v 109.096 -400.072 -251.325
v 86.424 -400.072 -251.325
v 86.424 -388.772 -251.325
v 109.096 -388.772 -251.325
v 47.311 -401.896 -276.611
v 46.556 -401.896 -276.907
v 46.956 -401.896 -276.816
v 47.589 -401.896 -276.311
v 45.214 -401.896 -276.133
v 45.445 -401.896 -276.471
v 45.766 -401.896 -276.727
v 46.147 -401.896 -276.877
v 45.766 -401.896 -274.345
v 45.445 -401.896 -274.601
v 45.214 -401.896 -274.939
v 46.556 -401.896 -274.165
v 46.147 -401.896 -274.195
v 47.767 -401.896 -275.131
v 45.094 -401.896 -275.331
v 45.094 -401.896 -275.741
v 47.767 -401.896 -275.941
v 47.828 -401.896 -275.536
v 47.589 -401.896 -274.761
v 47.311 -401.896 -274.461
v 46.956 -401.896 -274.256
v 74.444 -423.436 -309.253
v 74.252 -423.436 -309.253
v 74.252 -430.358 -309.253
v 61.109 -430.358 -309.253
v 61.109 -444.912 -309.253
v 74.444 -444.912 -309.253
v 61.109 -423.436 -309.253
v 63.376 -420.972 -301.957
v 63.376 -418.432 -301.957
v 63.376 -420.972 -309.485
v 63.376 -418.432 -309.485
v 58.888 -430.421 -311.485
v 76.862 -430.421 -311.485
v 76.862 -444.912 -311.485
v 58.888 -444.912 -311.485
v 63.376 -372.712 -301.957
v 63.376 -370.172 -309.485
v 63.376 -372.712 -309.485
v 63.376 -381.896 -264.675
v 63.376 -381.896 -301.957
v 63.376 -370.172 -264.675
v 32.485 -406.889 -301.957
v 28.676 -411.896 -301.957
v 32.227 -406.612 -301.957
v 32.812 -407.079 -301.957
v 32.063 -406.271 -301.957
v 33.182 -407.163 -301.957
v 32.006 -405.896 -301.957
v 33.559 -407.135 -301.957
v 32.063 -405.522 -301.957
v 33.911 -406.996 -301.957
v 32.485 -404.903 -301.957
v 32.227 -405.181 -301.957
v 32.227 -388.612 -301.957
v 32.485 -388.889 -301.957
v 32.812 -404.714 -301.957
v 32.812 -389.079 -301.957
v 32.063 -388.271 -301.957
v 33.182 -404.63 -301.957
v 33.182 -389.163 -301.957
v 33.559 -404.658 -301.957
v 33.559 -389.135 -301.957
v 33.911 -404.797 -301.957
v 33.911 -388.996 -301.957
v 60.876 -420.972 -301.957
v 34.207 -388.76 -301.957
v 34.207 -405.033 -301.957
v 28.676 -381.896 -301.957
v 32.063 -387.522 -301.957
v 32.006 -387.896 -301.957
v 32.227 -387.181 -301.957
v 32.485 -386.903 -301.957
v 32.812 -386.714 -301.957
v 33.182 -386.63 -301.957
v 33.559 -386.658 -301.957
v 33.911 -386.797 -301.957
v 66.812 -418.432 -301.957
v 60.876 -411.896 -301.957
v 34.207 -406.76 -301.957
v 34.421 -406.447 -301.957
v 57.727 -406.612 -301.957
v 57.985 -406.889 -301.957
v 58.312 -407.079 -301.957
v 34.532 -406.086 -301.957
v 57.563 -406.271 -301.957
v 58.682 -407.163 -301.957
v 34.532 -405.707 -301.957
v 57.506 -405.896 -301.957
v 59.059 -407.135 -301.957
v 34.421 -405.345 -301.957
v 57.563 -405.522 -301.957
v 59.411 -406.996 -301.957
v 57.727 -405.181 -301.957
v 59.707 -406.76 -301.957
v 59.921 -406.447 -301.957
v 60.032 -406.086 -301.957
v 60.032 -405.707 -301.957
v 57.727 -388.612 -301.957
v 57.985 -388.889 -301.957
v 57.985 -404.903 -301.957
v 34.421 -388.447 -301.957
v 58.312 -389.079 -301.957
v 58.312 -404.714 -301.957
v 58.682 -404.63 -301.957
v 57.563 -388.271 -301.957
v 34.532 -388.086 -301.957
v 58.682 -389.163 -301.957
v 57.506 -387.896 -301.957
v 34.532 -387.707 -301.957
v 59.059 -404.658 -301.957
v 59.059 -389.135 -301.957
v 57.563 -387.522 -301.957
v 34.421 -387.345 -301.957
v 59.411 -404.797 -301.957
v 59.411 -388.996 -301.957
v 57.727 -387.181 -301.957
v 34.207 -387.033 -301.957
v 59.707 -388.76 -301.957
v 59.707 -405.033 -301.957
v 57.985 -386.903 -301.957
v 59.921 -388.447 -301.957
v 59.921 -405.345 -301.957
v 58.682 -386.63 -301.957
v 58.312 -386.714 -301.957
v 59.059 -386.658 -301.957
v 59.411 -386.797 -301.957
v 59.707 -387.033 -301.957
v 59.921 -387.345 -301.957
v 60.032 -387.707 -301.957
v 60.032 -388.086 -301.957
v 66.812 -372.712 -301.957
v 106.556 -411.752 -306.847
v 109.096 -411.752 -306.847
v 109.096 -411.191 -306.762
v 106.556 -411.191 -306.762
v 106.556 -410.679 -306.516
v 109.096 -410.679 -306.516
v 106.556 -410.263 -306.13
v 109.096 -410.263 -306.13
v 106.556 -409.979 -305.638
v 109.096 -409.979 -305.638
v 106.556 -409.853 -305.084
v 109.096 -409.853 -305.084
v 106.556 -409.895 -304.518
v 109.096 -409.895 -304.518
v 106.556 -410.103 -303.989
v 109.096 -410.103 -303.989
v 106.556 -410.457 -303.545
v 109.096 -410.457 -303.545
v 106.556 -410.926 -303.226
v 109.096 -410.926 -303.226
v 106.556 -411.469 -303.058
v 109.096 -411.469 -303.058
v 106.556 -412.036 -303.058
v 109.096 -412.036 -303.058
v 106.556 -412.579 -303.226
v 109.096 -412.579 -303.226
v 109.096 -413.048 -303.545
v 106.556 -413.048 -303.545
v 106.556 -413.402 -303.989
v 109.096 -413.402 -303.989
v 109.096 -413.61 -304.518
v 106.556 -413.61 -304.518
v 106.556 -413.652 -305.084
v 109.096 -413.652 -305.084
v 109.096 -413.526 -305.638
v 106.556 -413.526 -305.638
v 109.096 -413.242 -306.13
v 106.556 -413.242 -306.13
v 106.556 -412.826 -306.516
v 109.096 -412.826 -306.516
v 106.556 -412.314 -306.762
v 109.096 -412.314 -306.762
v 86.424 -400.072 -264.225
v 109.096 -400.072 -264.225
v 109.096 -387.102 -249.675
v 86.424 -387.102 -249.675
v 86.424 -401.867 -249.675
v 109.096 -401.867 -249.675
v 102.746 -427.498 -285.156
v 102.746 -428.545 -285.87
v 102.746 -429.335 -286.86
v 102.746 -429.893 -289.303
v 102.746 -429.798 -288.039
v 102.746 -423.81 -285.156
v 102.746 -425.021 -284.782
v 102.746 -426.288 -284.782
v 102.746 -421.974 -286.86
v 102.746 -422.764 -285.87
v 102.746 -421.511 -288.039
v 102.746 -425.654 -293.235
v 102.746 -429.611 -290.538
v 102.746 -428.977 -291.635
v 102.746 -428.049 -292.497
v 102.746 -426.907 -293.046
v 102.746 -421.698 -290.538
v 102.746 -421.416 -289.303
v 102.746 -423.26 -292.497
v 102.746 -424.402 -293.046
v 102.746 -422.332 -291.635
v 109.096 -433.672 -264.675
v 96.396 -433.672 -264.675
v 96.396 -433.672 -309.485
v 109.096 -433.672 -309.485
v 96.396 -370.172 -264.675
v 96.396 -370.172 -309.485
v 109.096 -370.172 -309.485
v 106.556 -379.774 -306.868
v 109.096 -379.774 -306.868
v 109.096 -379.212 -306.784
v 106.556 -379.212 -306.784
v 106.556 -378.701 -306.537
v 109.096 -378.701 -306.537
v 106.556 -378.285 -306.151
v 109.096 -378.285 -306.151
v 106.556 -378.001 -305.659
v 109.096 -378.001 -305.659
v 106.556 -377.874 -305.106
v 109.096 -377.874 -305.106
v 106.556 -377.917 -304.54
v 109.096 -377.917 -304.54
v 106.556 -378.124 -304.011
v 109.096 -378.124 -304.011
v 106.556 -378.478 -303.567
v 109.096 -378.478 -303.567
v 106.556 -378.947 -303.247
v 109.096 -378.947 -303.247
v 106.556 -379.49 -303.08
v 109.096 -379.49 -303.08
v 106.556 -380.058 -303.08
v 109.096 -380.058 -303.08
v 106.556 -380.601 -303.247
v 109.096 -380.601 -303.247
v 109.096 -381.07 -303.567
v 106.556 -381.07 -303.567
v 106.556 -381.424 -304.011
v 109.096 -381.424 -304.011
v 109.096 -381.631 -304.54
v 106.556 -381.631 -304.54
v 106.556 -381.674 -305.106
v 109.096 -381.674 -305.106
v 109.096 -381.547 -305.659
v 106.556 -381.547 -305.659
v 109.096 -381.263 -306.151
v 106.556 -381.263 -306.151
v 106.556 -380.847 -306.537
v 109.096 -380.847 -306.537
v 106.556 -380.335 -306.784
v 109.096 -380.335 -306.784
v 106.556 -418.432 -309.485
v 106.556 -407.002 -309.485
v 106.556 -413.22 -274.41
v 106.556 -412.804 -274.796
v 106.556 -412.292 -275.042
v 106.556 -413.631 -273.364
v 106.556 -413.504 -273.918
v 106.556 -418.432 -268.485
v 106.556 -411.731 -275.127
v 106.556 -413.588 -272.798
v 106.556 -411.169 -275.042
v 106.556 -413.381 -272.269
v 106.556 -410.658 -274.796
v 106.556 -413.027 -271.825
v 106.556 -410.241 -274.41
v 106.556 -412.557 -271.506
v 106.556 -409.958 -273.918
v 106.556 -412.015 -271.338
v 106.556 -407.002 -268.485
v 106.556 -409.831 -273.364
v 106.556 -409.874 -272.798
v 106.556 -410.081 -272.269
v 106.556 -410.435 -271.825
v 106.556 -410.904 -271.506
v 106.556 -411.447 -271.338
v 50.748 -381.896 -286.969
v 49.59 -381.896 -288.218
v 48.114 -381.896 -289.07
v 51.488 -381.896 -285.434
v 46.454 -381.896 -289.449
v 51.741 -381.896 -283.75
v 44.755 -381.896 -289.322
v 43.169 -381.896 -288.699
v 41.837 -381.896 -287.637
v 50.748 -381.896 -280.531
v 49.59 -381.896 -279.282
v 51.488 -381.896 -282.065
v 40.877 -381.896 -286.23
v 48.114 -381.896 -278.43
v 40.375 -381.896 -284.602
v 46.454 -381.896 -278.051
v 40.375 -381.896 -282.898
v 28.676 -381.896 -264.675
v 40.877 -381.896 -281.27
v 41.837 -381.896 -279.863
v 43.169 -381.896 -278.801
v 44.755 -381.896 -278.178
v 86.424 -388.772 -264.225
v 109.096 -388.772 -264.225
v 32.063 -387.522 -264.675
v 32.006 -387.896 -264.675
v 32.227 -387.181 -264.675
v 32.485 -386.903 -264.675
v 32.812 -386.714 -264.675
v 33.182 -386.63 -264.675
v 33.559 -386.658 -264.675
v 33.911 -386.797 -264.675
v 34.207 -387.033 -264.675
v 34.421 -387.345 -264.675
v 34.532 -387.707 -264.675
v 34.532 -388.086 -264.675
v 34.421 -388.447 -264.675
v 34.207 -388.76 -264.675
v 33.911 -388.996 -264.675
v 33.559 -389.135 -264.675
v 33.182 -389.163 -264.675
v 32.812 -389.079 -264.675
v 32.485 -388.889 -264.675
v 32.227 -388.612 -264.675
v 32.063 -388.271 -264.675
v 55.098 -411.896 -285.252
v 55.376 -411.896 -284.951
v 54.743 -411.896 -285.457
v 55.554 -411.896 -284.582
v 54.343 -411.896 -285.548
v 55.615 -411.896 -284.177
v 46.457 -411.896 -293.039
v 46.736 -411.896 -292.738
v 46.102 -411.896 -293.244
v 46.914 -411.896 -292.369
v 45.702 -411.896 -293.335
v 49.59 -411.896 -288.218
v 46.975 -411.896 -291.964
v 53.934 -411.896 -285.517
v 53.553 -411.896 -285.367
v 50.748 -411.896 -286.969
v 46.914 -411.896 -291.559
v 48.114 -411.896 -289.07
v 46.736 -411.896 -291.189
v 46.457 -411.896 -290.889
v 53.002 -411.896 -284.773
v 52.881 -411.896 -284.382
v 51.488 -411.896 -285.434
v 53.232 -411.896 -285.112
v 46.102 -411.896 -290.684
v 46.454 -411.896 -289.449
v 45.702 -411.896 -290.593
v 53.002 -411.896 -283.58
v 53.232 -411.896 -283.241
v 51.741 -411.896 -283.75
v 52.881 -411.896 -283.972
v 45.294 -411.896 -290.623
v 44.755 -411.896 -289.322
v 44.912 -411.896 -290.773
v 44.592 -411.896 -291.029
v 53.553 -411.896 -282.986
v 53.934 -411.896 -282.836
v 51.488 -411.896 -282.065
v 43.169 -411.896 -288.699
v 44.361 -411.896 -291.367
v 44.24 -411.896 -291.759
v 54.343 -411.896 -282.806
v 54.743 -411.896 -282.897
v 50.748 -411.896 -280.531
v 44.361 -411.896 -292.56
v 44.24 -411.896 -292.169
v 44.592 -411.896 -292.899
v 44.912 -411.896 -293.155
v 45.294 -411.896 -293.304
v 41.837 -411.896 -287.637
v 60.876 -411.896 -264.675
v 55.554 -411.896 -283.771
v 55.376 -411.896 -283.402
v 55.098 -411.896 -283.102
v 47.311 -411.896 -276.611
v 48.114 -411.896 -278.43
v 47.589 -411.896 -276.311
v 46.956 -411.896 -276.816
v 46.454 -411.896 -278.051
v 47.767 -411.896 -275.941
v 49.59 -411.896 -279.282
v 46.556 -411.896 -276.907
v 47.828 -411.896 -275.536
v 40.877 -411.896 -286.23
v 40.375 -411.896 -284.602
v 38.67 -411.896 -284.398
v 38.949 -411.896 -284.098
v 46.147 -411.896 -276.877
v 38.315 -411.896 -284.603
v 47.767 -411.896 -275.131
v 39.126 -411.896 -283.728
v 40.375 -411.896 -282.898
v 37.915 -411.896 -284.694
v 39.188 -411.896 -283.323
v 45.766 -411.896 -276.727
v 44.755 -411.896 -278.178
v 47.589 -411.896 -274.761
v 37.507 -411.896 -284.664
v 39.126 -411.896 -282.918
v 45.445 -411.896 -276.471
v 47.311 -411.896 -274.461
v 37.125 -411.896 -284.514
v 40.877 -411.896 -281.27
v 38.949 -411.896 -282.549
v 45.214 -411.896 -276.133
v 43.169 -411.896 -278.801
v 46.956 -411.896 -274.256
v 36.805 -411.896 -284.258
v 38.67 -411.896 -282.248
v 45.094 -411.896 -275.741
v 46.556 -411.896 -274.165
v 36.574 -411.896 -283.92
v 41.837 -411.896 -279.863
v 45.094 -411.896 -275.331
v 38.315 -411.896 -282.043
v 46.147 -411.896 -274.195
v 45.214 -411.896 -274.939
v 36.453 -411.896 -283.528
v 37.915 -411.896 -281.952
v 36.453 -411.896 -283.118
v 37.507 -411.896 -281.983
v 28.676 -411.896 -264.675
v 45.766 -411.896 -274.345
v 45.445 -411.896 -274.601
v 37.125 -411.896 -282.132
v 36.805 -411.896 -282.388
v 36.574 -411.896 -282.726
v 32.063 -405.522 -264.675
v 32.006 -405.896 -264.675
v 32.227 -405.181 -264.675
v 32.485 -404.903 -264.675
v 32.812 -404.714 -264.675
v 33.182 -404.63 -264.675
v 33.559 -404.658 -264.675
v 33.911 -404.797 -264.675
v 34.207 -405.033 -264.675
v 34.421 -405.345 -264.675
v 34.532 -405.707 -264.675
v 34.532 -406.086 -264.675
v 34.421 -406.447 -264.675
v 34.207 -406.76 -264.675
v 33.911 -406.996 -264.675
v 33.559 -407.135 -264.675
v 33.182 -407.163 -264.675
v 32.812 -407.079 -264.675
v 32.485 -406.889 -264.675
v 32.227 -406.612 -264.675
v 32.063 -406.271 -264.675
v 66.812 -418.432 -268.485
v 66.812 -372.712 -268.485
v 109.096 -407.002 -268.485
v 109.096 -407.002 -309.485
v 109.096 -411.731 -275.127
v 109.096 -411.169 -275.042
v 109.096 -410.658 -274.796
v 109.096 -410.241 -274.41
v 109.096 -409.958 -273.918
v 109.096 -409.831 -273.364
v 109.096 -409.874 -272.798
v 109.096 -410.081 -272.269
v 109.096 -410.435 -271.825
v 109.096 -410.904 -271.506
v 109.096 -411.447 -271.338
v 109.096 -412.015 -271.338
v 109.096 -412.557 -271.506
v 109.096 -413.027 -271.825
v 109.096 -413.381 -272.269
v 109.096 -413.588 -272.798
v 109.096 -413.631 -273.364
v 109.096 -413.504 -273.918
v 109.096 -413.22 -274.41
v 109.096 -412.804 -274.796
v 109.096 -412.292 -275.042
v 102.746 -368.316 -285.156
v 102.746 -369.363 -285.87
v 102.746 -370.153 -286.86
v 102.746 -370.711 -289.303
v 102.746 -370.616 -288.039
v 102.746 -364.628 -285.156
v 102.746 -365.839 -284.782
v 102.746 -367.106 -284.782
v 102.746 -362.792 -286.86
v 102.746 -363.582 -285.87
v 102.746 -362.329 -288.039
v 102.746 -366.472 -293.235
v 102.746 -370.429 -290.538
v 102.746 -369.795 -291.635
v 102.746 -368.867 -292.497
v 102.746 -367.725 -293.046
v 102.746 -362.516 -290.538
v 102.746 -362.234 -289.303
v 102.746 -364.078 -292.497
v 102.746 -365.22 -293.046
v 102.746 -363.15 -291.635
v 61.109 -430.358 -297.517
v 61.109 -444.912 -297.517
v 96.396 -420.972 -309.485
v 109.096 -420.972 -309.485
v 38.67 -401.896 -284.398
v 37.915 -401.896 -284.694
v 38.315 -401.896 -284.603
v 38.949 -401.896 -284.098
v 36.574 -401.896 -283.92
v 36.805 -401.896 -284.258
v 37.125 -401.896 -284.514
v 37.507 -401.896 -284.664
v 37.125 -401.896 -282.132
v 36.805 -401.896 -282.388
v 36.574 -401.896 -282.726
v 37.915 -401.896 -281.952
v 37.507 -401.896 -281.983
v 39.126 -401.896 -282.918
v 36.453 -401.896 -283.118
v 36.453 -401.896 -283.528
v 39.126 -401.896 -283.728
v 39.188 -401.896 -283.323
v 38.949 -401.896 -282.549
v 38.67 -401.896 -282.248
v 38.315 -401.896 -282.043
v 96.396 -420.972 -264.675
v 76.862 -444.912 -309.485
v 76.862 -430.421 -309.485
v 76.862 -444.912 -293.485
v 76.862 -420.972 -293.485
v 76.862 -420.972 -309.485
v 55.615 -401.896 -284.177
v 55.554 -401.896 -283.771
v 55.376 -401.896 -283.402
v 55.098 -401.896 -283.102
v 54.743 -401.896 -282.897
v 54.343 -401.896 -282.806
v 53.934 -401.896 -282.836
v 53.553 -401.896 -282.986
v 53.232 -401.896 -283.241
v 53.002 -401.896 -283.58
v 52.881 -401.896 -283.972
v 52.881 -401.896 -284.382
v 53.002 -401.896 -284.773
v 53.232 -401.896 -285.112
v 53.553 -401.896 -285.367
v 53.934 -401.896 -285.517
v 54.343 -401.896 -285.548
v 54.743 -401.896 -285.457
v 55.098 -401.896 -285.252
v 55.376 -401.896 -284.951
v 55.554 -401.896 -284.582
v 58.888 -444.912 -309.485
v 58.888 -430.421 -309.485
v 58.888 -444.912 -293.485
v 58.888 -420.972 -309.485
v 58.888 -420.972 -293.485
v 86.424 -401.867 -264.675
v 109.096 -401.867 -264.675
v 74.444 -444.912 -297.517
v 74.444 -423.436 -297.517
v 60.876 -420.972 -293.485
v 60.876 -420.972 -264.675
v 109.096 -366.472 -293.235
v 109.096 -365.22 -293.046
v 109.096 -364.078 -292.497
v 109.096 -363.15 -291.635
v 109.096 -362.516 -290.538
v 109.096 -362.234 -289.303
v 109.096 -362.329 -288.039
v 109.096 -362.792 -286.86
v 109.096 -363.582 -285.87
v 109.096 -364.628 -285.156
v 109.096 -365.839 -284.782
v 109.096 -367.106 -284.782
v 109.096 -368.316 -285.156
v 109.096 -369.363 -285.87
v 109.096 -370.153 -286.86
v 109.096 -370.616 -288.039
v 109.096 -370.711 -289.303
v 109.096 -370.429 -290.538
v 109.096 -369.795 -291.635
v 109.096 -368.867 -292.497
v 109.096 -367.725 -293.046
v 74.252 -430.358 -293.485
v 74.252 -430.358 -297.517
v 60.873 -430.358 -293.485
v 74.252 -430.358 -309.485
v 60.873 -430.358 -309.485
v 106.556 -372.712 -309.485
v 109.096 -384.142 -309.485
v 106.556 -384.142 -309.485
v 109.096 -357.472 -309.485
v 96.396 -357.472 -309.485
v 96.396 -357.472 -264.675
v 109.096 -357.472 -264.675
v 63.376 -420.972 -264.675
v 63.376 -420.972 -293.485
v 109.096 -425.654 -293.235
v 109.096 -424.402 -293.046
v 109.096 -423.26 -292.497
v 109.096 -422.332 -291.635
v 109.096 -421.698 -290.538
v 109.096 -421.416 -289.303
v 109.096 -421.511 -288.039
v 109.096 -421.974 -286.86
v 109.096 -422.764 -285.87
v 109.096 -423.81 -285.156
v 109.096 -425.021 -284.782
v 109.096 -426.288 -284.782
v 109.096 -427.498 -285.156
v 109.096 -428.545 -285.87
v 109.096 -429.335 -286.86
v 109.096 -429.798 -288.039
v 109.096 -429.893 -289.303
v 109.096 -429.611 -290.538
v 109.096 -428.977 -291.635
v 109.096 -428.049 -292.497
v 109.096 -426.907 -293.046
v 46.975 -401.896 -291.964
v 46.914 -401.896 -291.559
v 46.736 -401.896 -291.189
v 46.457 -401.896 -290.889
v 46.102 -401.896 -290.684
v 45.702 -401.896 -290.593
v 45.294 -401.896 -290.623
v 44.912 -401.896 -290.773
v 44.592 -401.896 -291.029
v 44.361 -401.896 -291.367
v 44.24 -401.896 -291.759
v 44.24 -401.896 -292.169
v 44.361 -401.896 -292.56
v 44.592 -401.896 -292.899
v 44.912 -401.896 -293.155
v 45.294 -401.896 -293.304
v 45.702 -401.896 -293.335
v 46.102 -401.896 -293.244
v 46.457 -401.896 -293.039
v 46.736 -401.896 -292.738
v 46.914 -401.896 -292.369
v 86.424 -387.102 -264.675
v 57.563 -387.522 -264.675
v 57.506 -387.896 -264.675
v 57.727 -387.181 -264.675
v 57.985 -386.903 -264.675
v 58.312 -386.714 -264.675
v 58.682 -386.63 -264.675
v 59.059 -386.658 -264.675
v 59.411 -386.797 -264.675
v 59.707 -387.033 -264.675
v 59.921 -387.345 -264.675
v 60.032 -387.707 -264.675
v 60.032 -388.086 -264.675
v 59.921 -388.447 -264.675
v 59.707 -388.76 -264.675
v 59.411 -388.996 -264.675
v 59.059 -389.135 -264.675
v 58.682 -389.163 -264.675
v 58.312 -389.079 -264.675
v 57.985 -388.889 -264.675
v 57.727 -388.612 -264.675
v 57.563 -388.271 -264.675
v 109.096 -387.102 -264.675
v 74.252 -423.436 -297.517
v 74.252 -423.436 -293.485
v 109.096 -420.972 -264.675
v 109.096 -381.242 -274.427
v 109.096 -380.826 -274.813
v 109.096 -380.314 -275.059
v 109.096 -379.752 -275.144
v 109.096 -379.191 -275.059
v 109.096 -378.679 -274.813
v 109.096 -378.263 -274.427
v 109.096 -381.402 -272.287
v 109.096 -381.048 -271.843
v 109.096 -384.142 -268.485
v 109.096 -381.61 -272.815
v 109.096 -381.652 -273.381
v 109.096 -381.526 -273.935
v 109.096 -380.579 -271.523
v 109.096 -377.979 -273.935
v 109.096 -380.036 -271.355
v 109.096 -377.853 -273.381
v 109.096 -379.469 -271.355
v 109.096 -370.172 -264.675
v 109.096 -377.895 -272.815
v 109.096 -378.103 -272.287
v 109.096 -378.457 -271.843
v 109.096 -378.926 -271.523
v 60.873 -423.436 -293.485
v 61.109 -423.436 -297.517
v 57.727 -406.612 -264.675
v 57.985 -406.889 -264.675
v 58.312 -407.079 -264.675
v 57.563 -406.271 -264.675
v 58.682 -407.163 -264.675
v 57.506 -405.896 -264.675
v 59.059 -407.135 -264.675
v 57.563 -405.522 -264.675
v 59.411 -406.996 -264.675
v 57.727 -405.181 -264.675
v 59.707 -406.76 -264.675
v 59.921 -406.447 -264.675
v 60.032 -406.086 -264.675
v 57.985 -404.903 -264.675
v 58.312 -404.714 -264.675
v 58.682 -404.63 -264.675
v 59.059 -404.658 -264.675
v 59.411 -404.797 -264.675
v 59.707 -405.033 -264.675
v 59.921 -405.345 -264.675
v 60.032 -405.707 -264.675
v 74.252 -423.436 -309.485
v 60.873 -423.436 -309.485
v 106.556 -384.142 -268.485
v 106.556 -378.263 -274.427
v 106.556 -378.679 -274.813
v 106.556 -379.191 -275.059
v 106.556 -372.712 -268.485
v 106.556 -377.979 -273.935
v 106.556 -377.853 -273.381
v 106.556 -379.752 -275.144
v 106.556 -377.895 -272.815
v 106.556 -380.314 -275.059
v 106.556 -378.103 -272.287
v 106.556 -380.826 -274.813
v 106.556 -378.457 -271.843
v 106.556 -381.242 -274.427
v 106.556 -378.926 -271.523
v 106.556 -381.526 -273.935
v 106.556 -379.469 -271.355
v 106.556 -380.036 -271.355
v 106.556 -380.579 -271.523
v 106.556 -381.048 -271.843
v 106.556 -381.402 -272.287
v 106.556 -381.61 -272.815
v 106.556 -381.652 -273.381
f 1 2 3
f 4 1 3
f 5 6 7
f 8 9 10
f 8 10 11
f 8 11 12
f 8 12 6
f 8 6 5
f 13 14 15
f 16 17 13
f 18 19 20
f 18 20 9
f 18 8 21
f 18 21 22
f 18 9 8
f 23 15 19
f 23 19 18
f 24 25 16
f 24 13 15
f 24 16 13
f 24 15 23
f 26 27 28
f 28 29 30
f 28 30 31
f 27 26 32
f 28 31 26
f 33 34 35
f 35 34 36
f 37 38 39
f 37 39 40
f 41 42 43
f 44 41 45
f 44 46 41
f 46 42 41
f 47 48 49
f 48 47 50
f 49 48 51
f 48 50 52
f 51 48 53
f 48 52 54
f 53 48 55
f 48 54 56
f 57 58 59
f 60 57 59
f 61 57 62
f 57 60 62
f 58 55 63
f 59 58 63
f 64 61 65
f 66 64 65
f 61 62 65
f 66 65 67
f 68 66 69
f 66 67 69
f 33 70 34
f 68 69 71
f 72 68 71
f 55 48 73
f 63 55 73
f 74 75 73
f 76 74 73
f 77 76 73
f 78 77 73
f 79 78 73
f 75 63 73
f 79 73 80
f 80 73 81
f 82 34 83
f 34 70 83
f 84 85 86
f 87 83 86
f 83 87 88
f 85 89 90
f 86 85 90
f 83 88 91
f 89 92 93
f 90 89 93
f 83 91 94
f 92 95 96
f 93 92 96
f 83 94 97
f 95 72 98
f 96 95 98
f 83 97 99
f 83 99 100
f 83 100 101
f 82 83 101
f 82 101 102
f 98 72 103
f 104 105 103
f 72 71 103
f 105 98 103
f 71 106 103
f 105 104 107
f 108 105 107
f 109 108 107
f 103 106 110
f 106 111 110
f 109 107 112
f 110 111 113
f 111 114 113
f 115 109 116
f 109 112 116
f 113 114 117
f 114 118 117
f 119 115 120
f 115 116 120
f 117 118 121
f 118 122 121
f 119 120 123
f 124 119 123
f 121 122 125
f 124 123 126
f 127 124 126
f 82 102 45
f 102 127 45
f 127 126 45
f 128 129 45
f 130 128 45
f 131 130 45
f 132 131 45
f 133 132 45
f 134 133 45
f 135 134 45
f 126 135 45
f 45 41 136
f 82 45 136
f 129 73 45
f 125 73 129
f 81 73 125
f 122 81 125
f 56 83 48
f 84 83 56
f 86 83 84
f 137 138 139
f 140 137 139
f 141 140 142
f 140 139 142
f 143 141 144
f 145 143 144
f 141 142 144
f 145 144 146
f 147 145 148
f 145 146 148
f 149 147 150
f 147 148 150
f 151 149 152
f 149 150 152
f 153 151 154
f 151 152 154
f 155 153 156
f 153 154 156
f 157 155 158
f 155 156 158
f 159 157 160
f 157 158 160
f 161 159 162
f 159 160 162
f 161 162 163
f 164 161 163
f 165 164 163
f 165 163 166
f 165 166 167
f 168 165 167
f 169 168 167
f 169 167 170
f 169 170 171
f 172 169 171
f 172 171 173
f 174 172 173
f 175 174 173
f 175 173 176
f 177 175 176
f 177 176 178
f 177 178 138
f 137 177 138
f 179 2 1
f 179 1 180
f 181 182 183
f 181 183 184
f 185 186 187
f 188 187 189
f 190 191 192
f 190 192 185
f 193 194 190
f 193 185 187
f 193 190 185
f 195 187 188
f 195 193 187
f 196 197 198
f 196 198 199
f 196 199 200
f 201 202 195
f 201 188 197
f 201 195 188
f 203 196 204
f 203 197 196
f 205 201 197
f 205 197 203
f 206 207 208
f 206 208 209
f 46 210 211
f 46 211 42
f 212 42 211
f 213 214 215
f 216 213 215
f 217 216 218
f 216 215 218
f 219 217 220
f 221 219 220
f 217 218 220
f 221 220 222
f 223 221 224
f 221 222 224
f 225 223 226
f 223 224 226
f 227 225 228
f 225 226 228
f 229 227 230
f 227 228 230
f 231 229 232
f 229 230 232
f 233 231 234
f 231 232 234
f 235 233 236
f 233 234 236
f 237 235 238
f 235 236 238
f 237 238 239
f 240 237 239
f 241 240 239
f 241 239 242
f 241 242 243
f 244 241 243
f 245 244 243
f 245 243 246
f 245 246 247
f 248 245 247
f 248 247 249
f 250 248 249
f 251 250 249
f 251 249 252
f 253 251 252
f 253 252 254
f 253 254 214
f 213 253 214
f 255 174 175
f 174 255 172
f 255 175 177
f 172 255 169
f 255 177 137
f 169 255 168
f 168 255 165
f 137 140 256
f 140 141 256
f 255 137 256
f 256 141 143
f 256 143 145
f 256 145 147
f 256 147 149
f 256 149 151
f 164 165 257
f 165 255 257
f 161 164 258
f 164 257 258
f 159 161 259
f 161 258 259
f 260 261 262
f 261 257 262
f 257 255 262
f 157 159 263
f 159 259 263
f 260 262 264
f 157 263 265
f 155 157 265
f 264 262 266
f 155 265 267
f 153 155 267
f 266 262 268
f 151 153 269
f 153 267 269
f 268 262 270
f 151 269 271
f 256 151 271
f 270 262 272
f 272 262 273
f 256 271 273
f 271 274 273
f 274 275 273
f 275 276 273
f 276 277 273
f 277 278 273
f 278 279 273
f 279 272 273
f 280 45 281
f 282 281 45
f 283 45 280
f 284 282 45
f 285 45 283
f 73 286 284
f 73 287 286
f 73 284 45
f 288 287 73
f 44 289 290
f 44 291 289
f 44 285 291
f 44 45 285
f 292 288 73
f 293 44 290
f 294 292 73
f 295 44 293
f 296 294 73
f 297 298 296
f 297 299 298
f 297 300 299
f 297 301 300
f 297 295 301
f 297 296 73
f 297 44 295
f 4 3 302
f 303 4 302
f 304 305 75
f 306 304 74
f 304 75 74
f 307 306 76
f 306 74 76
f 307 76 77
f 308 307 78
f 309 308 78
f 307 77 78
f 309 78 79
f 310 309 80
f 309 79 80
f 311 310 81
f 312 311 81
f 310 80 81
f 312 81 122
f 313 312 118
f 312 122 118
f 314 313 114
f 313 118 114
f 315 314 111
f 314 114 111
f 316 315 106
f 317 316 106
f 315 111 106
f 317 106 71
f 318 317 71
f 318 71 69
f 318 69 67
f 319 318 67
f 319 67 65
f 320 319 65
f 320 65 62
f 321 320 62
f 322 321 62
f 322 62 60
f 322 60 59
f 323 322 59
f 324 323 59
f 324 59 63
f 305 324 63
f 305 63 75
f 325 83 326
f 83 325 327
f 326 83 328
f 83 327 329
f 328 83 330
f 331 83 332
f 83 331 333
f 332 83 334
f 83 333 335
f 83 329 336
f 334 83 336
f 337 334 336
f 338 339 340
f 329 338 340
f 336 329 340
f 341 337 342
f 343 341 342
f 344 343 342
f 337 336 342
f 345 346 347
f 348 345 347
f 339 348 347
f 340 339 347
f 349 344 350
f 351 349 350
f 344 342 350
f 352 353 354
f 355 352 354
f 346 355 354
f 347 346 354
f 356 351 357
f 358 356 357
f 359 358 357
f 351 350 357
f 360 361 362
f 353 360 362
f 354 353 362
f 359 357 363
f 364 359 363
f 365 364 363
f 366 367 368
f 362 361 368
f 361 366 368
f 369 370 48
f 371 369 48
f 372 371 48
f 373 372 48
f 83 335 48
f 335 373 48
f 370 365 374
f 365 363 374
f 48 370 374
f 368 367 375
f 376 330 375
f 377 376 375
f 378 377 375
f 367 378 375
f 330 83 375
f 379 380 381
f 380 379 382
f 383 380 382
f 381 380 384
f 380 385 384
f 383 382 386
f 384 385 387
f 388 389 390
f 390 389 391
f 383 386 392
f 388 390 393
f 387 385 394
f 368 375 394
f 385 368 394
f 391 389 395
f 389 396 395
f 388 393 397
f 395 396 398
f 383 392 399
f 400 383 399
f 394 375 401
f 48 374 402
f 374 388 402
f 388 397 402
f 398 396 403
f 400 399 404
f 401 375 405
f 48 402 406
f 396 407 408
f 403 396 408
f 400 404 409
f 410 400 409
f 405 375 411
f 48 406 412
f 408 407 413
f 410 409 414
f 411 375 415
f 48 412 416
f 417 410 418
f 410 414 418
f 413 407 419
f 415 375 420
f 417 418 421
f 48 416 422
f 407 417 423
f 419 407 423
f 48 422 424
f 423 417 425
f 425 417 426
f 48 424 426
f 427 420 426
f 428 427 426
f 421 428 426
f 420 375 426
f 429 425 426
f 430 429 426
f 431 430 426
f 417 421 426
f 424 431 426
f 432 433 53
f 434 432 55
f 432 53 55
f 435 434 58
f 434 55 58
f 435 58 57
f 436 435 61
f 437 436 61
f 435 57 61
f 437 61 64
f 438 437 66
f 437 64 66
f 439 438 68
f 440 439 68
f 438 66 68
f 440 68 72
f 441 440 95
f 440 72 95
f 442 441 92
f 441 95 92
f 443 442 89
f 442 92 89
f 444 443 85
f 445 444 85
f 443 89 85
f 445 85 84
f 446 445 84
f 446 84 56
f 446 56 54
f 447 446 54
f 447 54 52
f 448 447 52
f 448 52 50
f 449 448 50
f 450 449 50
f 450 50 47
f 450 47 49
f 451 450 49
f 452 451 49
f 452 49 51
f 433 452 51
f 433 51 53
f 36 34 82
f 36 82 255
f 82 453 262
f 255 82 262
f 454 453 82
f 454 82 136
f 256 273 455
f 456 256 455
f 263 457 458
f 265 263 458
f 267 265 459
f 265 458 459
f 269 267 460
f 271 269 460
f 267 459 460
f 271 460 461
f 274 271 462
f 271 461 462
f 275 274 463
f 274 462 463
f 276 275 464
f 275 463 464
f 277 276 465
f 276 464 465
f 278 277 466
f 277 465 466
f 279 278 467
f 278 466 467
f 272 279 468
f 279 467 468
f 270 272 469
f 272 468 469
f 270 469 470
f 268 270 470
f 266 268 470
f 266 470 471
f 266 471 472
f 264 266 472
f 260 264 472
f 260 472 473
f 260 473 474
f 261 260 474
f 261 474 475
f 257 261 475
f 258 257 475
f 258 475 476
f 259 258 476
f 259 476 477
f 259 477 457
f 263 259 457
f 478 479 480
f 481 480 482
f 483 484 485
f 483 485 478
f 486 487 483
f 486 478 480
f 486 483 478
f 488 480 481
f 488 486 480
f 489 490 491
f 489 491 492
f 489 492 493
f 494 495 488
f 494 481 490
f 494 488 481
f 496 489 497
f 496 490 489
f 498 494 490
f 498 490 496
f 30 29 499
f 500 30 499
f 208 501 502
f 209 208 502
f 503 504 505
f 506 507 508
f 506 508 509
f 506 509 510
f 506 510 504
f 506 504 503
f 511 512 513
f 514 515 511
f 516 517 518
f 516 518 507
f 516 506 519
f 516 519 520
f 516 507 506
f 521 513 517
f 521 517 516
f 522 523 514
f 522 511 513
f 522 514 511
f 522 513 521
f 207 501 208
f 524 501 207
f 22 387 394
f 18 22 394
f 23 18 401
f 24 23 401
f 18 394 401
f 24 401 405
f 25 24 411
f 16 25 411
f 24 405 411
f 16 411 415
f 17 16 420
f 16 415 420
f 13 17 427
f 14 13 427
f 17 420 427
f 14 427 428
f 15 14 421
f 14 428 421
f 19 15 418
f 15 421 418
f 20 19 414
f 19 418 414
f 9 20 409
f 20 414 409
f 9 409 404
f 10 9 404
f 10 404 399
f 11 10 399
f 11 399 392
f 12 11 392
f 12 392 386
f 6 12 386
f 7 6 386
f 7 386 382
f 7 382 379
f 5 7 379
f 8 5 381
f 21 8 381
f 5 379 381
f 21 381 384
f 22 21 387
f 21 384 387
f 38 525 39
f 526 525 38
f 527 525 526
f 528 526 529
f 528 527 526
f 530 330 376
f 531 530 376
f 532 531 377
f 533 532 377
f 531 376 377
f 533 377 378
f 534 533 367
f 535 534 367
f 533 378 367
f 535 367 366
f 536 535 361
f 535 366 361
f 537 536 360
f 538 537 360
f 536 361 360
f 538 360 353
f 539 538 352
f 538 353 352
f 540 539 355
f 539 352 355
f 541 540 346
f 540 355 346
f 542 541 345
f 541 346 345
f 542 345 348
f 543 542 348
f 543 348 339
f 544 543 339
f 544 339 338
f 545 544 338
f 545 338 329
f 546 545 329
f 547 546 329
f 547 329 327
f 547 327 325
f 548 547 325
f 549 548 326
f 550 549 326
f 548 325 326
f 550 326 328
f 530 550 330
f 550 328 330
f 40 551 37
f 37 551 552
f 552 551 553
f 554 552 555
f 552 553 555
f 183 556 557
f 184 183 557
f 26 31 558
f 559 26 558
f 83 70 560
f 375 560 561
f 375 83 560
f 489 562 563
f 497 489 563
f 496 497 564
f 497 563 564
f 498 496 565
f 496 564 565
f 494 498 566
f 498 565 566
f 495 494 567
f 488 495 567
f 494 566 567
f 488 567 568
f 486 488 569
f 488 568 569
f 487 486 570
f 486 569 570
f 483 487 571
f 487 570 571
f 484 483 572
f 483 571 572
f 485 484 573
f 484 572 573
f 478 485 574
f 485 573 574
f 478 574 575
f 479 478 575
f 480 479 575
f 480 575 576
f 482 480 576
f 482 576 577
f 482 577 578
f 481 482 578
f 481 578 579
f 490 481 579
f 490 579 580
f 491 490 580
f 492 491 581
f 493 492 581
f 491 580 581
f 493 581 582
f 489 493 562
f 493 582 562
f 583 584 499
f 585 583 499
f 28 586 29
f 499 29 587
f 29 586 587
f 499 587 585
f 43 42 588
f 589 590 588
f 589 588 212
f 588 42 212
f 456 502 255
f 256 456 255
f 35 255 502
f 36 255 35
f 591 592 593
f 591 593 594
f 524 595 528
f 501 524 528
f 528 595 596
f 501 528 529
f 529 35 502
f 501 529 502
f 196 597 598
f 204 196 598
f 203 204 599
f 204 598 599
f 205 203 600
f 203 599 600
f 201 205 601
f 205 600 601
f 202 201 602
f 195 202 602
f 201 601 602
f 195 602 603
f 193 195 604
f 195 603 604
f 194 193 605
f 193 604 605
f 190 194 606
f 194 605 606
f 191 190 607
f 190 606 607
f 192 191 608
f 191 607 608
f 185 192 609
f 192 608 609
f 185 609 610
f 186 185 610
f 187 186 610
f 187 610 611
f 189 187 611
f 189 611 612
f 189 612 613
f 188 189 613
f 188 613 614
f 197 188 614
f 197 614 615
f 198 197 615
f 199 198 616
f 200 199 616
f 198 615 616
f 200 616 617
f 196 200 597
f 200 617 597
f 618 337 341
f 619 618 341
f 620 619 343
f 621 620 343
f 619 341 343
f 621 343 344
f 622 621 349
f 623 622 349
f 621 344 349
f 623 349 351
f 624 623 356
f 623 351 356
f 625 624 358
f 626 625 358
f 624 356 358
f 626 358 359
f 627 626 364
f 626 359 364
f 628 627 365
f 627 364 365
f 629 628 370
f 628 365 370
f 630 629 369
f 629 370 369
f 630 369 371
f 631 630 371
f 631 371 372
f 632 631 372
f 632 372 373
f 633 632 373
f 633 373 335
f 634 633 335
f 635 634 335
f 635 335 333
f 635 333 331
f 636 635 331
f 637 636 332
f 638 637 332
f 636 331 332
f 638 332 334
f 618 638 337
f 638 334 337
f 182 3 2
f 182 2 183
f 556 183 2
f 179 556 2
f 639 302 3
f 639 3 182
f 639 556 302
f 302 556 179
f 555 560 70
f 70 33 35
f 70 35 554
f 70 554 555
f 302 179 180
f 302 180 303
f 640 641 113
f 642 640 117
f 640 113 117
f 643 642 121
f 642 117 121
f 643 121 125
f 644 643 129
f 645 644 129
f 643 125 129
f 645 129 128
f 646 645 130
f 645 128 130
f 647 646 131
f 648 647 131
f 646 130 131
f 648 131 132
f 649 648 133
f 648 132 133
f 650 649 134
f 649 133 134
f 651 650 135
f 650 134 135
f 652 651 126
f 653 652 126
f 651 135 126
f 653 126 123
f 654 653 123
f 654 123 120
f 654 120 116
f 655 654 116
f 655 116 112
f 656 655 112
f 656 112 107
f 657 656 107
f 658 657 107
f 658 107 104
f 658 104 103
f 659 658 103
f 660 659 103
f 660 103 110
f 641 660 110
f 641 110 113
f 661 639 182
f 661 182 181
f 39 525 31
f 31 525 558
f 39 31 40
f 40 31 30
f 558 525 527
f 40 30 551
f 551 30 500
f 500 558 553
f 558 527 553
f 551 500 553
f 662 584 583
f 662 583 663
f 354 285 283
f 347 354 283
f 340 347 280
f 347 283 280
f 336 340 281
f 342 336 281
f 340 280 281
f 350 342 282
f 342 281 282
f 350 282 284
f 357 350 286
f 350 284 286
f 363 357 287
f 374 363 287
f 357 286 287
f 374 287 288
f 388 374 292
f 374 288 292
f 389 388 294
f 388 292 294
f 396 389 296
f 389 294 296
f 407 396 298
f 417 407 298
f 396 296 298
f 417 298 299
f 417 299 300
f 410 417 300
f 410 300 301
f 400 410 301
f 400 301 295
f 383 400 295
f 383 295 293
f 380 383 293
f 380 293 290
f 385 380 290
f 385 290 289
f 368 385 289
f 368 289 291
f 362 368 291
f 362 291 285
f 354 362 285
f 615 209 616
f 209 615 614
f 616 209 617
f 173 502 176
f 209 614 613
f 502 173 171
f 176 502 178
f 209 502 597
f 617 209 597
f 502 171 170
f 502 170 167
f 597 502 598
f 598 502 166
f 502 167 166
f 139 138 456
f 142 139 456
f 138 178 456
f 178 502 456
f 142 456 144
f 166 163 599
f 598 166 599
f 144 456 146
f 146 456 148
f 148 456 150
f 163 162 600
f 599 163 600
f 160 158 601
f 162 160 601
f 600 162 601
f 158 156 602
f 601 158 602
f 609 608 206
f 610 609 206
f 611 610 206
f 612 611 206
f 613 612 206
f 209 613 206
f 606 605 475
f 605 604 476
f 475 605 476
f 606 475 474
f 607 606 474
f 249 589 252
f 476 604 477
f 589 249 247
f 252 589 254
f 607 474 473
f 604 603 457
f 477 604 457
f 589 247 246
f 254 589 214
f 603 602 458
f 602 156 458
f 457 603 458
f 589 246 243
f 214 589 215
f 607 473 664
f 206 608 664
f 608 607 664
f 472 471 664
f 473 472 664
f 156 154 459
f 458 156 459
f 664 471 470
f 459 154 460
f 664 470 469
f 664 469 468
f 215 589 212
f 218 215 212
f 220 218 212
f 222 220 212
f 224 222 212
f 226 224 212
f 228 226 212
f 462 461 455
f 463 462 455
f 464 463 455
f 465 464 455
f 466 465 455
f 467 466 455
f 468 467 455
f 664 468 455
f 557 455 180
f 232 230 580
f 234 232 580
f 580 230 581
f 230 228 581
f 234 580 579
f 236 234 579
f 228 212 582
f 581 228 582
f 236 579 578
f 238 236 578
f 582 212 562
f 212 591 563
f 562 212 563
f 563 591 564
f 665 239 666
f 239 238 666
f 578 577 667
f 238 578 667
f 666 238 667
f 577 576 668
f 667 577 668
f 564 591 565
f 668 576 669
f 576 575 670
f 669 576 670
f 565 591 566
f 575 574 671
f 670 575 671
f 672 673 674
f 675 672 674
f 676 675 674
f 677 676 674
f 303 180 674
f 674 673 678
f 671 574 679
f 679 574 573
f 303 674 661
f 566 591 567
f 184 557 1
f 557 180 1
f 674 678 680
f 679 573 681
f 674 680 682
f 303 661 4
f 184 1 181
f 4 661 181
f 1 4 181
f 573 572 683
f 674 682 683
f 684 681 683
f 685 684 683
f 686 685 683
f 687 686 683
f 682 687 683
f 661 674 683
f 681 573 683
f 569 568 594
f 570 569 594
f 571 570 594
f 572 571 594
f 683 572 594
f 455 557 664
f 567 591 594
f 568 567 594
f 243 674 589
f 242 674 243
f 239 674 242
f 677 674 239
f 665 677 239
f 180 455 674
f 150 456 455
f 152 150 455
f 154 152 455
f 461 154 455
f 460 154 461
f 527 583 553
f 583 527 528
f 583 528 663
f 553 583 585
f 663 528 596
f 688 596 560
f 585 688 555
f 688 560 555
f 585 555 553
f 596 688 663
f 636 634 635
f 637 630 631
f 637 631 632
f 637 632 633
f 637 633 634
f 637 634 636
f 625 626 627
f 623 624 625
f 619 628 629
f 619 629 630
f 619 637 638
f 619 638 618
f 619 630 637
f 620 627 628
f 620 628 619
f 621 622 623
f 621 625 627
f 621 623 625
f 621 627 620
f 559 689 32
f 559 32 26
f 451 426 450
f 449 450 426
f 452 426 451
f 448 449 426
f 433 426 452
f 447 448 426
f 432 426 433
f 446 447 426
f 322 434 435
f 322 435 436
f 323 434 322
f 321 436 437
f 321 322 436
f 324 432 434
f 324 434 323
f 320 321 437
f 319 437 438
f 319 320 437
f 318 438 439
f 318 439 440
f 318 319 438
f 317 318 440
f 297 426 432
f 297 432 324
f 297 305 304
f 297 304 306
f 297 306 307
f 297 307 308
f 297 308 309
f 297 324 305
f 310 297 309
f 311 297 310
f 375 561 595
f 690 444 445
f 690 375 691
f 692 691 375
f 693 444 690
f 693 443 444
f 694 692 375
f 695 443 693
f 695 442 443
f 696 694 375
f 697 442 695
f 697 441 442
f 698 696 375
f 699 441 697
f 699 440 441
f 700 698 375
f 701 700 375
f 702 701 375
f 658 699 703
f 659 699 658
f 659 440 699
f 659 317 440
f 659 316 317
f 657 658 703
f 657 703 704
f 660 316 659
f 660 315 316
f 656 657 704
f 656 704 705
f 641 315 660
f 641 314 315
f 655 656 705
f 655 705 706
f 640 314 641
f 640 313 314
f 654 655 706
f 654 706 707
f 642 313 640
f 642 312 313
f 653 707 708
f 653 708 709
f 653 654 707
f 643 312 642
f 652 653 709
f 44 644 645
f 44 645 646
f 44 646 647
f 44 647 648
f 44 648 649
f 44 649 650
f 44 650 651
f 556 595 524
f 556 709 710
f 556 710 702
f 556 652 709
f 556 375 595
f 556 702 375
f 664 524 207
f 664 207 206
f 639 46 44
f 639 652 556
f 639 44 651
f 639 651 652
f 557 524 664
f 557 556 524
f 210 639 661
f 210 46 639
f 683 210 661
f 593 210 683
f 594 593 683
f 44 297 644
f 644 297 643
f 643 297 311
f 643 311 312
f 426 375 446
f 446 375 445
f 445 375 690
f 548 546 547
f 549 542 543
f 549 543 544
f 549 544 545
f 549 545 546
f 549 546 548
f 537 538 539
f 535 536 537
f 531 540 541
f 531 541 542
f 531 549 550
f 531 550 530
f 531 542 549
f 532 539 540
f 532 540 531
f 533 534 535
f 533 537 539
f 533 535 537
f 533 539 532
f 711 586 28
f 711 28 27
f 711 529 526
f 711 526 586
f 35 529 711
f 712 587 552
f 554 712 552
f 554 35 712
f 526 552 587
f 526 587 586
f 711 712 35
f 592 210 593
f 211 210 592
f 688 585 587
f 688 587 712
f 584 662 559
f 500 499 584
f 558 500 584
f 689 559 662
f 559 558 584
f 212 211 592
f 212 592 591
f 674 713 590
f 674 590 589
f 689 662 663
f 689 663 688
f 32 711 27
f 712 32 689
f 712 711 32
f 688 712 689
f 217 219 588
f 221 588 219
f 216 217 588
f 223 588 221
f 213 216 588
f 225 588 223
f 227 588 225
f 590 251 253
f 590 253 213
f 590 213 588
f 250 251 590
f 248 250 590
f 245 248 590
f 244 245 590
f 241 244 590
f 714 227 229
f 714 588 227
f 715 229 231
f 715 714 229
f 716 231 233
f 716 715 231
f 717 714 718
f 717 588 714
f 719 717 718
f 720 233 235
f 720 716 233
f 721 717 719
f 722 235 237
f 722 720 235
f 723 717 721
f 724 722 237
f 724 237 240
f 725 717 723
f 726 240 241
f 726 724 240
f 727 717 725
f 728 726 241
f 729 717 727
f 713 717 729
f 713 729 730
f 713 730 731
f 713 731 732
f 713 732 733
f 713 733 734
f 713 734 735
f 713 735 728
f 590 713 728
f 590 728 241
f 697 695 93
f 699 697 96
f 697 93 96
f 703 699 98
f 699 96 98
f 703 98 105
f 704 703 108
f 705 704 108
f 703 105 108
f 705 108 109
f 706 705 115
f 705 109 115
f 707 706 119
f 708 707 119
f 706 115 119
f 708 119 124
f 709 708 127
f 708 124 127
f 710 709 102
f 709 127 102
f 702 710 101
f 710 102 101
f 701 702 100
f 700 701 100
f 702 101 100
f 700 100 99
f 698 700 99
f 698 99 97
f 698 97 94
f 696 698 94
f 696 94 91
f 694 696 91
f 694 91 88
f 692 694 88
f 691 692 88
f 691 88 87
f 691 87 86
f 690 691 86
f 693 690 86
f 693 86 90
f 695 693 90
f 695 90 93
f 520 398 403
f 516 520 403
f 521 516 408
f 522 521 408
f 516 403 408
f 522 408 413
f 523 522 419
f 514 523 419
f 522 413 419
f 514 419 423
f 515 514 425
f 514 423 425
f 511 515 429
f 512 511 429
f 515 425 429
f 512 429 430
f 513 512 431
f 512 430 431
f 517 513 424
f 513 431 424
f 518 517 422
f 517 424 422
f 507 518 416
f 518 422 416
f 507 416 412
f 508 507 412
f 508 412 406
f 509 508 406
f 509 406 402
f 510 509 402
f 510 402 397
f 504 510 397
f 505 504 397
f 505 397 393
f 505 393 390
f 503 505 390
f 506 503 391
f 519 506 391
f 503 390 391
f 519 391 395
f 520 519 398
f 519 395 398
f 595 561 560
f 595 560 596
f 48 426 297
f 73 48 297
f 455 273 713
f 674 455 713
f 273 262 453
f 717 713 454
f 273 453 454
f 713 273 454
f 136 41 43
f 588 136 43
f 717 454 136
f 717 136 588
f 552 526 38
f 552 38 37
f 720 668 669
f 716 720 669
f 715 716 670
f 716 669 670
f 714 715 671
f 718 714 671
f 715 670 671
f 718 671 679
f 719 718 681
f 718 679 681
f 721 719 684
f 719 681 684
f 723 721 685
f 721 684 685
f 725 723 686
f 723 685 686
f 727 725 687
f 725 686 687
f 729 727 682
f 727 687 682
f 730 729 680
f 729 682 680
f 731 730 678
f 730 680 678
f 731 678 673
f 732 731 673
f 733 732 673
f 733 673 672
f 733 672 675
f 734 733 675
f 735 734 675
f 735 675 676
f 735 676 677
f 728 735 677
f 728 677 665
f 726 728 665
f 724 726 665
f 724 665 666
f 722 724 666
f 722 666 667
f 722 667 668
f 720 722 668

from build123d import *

# Parameters (mm, degrees)
SKETCH1_W            = 34.7
SKETCH1_H            = 30
BOSS_EXTRUDE1_DEPTH  = 37.282
SKETCH4_R            = 5.715
CUT_EXTRUDE1_DEPTH   = 31
SKETCH8_W            = 3.81
SKETCH8_H            = 50.8
BOSS_EXTRUDE6_DEPTH  = 45.72
BOSS_EXTRUDE7_DEPTH  = 41.000001
CUT_EXTRUDE2_REACH   = 82.42
SKETCH10_R           = 1.905
SKETCH11_W           = 12.7
SKETCH11_H           = 44.810000611
BOSS_EXTRUDE8_DEPTH  = 12.7
SKETCH12_W           = 12.7
SKETCH12_H           = 44.810000611
BOSS_EXTRUDE9_DEPTH  = 12.7
SKETCH13_R           = 4.25
CUT_EXTRUDE3_DEPTH   = 6.35
SKETCH17_W           = 3.43592392
SKETCH17_H           = 45.72
BOSS_EXTRUDE12_DEPTH = 33.472
SKETCH16_W           = 2.5
SKETCH16_H           = 37.282
BOSS_EXTRUDE11_DEPTH = 9.076061
SKETCH21_W           = 17.974491303
SKETCH21_H           = 23.94
BOSS_EXTRUDE13_DEPTH = 16
SKETCH22_W           = 13.379509134
SKETCH22_H           = 6.922502695
CUT_EXTRUDE4_DEPTH   = 45.810000611
SKETCH23_W           = 13.335762063
SKETCH23_H           = 11.735762062
CUT_EXTRUDE5_DEPTH   = 21.47692
SKETCH24_W           = 22.672584076
SKETCH24_H           = 14.765845737
BOSS_EXTRUDE14_DEPTH = 15
SKETCH25_W           = 12.9
SKETCH25_H           = 11.3
CUT_EXTRUDE6_DEPTH   = 22.672584
SKETCH5_R            = 1.375
CUT_EXTRUDE7_DEPTH   = 10
SKETCH6_R            = 1.27
CUT_EXTRUDE8_DEPTH   = 53.282
SKETCH27_W           = 17.974491303
SKETCH27_H           = 14.491353785
BOSS_EXTRUDE15_DEPTH = 2


with BuildPart() as part:
    # Sketch1 → Boss-Extrude1 (new body)
    with BuildSketch(Plane(origin=(0, 0, -264.675), x_dir=(-1, 0, 0), z_dir=(0, 0, -1))):
        with Locations((-46.026450848, -396.896376681)):
            Rectangle(SKETCH1_W, SKETCH1_H)
    extrude(amount=BOSS_EXTRUDE1_DEPTH)

    # Sketch4 → Cut-Extrude1 (cut, through all)
    with BuildSketch(Plane(origin=(0, -381.896376681, 0), x_dir=(1, 0, 0), z_dir=(0, 1, 0))):
        with Locations((46.026450848, 283.749893694)):
            Circle(SKETCH4_R)
    extrude(amount=-CUT_EXTRUDE1_DEPTH, mode=Mode.SUBTRACT)

    # Sketch8 → Boss-Extrude6 (add)
    with BuildSketch(Plane(origin=(63.376450848, 0, 0), x_dir=(0, 0, -1), z_dir=(1, 0, 0))):
        with Locations((266.58, -395.572437442)):
            Rectangle(SKETCH8_W, SKETCH8_H)
    extrude(amount=BOSS_EXTRUDE6_DEPTH)

    # Sketch9 → Boss-Extrude7 (add)
    with BuildSketch(Plane(origin=(0, 0, -268.485), x_dir=(-1, 0, 0), z_dir=(0, 0, -1))):
        Polygon((-109.096450848, -370.172437442), (-63.376450848, -370.172437442), (-63.376450848, -372.712437442), (-106.556450848, -372.712437442), (-106.556450848, -384.142437442), (-109.096450848, -384.142437442), (-109.096450848, -372.712437442), align=None)
        Polygon((-109.096450848, -420.972437442), (-63.376450848, -420.972437442), (-63.376450848, -418.432437442), (-106.556450848, -418.432437442), (-106.556450848, -407.002437442), (-109.096450848, -407.002437442), (-109.096450848, -418.432437442), align=None)
    extrude(amount=BOSS_EXTRUDE7_DEPTH)

    # Sketch10 → Cut-Extrude2 (cut, up to next)
    with BuildSketch(Plane(origin=(109.096450848, 0, 0), x_dir=(0, 0, -1), z_dir=(1, 0, 0)), mode=Mode.PRIVATE) as cut_extrude2_sk1:
        with Locations((304.963451053, -379.773986799)):
            Circle(SKETCH10_R)
    cut_extrude2_tool1 = extrude(cut_extrude2_sk1.sketch, amount=-CUT_EXTRUDE2_REACH, mode=Mode.PRIVATE) & part.part
    add(cut_extrude2_tool1.solids().sort_by_distance((109.096451, -379.773987, -304.963451))[0], mode=Mode.SUBTRACT)
    # Sketch10 → Cut-Extrude2 (cut, up to next)
    with BuildSketch(Plane(origin=(109.096450848, 0, 0), x_dir=(0, 0, -1), z_dir=(1, 0, 0)), mode=Mode.PRIVATE) as cut_extrude2_sk2:
        with Locations((304.941901697, -411.752437852)):
            Circle(SKETCH10_R)
    cut_extrude2_tool2 = extrude(cut_extrude2_sk2.sketch, amount=-CUT_EXTRUDE2_REACH, mode=Mode.PRIVATE) & part.part
    add(cut_extrude2_tool2.solids().sort_by_distance((109.096451, -411.752438, -304.941902))[0], mode=Mode.SUBTRACT)
    # Sketch10 → Cut-Extrude2 (cut, up to next)
    with BuildSketch(Plane(origin=(109.096450848, 0, 0), x_dir=(0, 0, -1), z_dir=(1, 0, 0)), mode=Mode.PRIVATE) as cut_extrude2_sk3:
        with Locations((273.239000003, -379.752437442)):
            Circle(SKETCH10_R)
    cut_extrude2_tool3 = extrude(cut_extrude2_sk3.sketch, amount=-CUT_EXTRUDE2_REACH, mode=Mode.PRIVATE) & part.part
    add(cut_extrude2_tool3.solids().sort_by_distance((109.096451, -379.752437, -273.239))[0], mode=Mode.SUBTRACT)
    # Sketch10 → Cut-Extrude2 (cut, up to next)
    with BuildSketch(Plane(origin=(109.096450848, 0, 0), x_dir=(0, 0, -1), z_dir=(1, 0, 0)), mode=Mode.PRIVATE) as cut_extrude2_sk4:
        with Locations((273.221901697, -411.730888495)):
            Circle(SKETCH10_R)
    cut_extrude2_tool4 = extrude(cut_extrude2_sk4.sketch, amount=-CUT_EXTRUDE2_REACH, mode=Mode.PRIVATE) & part.part
    add(cut_extrude2_tool4.solids().sort_by_distance((109.096451, -411.730888, -273.221902))[0], mode=Mode.SUBTRACT)

    # Sketch11 → Boss-Extrude8 (add)
    with BuildSketch(Plane(origin=(0, -370.172437442, 0), x_dir=(1, 0, 0), z_dir=(0, 1, 0))):
        with Locations((102.746450848, 287.080000305)):
            Rectangle(SKETCH11_W, SKETCH11_H)
    extrude(amount=BOSS_EXTRUDE8_DEPTH)

    # Sketch12 → Boss-Extrude9 (add)
    with BuildSketch(Plane.XZ.offset(420.972437442)):
        with Locations((102.746450848, -287.080000305)):
            Rectangle(SKETCH12_W, SKETCH12_H)
    extrude(amount=BOSS_EXTRUDE9_DEPTH)

    # Sketch13 → Cut-Extrude3 (cut)
    with BuildSketch(Plane(origin=(109.096450848, 0, 0), x_dir=(0, 0, -1), z_dir=(1, 0, 0))):
        with Locations((288.985000522, -366.472437442)):
            Circle(SKETCH13_R)
        with Locations((288.985000522, -425.654437442)):
            Circle(SKETCH13_R)
    extrude(amount=-CUT_EXTRUDE3_DEPTH, mode=Mode.SUBTRACT)

    # Sketch17 → Boss-Extrude12 (add)
    with BuildSketch(Plane(origin=(0, 0, -268.485), x_dir=(-1, 0, 0), z_dir=(0, 0, -1))):
        with Locations((-65.094412808, -395.572437442)):
            Rectangle(SKETCH17_W, SKETCH17_H)
    extrude(amount=BOSS_EXTRUDE12_DEPTH)

    # Sketch16 → Boss-Extrude11 (add)
    with BuildSketch(Plane.XZ.offset(411.896376681)):
        with Locations((62.126450848, -283.316)):
            Rectangle(SKETCH16_W, SKETCH16_H)
    extrude(amount=BOSS_EXTRUDE11_DEPTH)

    # Sketch21 → Boss-Extrude13 (add)
    with BuildSketch(Plane(origin=(0, 0, -309.485000611), x_dir=(-1, 0, 0), z_dir=(0, 0, -1))):
        with Locations((-67.875046239, -432.942437442)):
            Rectangle(SKETCH21_W, SKETCH21_H)
    extrude(amount=-BOSS_EXTRUDE13_DEPTH)

    # Sketch22 → Cut-Extrude4 (cut, through all)
    with BuildSketch(Plane(origin=(0, 0, -309.485000611), x_dir=(-1, 0, 0), z_dir=(0, 0, -1))):
        with Locations((-67.562480009, -426.896769229)):
            Rectangle(SKETCH22_W, SKETCH22_H)
    extrude(amount=-CUT_EXTRUDE4_DEPTH, mode=Mode.SUBTRACT)

    # Sketch23 → Cut-Extrude5 (cut)
    with BuildSketch(Plane.XZ.offset(444.912437442)):
        with Locations((67.776450849, -303.385000611)):
            Rectangle(SKETCH23_W, SKETCH23_H)
    extrude(amount=-CUT_EXTRUDE5_DEPTH, mode=Mode.SUBTRACT)

    # Sketch24 → Boss-Extrude14 (add)
    with BuildSketch(Plane.XY.offset(-264.675)):
        with Locations((97.76015881, -394.484447642)):
            Rectangle(SKETCH24_W, SKETCH24_H)
    extrude(amount=BOSS_EXTRUDE14_DEPTH)

    # Sketch25 → Cut-Extrude6 (cut)
    with BuildSketch(Plane(origin=(109.096450848, 0, 0), x_dir=(0, 0, -1), z_dir=(1, 0, 0))):
        with Locations((257.775, -394.422437442)):
            Rectangle(SKETCH25_W, SKETCH25_H)
    extrude(amount=-CUT_EXTRUDE6_DEPTH, mode=Mode.SUBTRACT)

    # Sketch5 → Cut-Extrude7 (cut)
    with BuildSketch(Plane.XZ.offset(411.896376681)):
        with Locations((46.453266338, -275.535975412)):
            Circle(SKETCH5_R)
        with Locations((54.24036913, -284.176709184)):
            Circle(SKETCH5_R)
        with Locations((45.599635358, -291.963811975)):
            Circle(SKETCH5_R)
        with Locations((37.812532567, -283.323078204)):
            Circle(SKETCH5_R)
    extrude(amount=-CUT_EXTRUDE7_DEPTH, mode=Mode.SUBTRACT)

    # Sketch6 → Cut-Extrude8 (cut, through all)
    with BuildSketch(Plane(origin=(0, 0, -301.957), x_dir=(-1, 0, 0), z_dir=(0, 0, -1))):
        with Locations((-58.776450848, -387.896376681)):
            Circle(SKETCH6_R)
        with Locations((-33.276450848, -387.896376681)):
            Circle(SKETCH6_R)
        with Locations((-33.276450848, -405.896376681)):
            Circle(SKETCH6_R)
        with Locations((-58.776450848, -405.896376681)):
            Circle(SKETCH6_R)
    extrude(amount=-CUT_EXTRUDE8_DEPTH, mode=Mode.SUBTRACT)

    # Sketch27 → Boss-Extrude15 (add)
    with BuildSketch(Plane(origin=(0, 0, -309.485000611), x_dir=(-1, 0, 0), z_dir=(0, 0, -1))):
        with Locations((-67.875046239, -437.66676055)):
            Rectangle(SKETCH27_W, SKETCH27_H)
    extrude(amount=BOSS_EXTRUDE15_DEPTH)


solid = part.part
